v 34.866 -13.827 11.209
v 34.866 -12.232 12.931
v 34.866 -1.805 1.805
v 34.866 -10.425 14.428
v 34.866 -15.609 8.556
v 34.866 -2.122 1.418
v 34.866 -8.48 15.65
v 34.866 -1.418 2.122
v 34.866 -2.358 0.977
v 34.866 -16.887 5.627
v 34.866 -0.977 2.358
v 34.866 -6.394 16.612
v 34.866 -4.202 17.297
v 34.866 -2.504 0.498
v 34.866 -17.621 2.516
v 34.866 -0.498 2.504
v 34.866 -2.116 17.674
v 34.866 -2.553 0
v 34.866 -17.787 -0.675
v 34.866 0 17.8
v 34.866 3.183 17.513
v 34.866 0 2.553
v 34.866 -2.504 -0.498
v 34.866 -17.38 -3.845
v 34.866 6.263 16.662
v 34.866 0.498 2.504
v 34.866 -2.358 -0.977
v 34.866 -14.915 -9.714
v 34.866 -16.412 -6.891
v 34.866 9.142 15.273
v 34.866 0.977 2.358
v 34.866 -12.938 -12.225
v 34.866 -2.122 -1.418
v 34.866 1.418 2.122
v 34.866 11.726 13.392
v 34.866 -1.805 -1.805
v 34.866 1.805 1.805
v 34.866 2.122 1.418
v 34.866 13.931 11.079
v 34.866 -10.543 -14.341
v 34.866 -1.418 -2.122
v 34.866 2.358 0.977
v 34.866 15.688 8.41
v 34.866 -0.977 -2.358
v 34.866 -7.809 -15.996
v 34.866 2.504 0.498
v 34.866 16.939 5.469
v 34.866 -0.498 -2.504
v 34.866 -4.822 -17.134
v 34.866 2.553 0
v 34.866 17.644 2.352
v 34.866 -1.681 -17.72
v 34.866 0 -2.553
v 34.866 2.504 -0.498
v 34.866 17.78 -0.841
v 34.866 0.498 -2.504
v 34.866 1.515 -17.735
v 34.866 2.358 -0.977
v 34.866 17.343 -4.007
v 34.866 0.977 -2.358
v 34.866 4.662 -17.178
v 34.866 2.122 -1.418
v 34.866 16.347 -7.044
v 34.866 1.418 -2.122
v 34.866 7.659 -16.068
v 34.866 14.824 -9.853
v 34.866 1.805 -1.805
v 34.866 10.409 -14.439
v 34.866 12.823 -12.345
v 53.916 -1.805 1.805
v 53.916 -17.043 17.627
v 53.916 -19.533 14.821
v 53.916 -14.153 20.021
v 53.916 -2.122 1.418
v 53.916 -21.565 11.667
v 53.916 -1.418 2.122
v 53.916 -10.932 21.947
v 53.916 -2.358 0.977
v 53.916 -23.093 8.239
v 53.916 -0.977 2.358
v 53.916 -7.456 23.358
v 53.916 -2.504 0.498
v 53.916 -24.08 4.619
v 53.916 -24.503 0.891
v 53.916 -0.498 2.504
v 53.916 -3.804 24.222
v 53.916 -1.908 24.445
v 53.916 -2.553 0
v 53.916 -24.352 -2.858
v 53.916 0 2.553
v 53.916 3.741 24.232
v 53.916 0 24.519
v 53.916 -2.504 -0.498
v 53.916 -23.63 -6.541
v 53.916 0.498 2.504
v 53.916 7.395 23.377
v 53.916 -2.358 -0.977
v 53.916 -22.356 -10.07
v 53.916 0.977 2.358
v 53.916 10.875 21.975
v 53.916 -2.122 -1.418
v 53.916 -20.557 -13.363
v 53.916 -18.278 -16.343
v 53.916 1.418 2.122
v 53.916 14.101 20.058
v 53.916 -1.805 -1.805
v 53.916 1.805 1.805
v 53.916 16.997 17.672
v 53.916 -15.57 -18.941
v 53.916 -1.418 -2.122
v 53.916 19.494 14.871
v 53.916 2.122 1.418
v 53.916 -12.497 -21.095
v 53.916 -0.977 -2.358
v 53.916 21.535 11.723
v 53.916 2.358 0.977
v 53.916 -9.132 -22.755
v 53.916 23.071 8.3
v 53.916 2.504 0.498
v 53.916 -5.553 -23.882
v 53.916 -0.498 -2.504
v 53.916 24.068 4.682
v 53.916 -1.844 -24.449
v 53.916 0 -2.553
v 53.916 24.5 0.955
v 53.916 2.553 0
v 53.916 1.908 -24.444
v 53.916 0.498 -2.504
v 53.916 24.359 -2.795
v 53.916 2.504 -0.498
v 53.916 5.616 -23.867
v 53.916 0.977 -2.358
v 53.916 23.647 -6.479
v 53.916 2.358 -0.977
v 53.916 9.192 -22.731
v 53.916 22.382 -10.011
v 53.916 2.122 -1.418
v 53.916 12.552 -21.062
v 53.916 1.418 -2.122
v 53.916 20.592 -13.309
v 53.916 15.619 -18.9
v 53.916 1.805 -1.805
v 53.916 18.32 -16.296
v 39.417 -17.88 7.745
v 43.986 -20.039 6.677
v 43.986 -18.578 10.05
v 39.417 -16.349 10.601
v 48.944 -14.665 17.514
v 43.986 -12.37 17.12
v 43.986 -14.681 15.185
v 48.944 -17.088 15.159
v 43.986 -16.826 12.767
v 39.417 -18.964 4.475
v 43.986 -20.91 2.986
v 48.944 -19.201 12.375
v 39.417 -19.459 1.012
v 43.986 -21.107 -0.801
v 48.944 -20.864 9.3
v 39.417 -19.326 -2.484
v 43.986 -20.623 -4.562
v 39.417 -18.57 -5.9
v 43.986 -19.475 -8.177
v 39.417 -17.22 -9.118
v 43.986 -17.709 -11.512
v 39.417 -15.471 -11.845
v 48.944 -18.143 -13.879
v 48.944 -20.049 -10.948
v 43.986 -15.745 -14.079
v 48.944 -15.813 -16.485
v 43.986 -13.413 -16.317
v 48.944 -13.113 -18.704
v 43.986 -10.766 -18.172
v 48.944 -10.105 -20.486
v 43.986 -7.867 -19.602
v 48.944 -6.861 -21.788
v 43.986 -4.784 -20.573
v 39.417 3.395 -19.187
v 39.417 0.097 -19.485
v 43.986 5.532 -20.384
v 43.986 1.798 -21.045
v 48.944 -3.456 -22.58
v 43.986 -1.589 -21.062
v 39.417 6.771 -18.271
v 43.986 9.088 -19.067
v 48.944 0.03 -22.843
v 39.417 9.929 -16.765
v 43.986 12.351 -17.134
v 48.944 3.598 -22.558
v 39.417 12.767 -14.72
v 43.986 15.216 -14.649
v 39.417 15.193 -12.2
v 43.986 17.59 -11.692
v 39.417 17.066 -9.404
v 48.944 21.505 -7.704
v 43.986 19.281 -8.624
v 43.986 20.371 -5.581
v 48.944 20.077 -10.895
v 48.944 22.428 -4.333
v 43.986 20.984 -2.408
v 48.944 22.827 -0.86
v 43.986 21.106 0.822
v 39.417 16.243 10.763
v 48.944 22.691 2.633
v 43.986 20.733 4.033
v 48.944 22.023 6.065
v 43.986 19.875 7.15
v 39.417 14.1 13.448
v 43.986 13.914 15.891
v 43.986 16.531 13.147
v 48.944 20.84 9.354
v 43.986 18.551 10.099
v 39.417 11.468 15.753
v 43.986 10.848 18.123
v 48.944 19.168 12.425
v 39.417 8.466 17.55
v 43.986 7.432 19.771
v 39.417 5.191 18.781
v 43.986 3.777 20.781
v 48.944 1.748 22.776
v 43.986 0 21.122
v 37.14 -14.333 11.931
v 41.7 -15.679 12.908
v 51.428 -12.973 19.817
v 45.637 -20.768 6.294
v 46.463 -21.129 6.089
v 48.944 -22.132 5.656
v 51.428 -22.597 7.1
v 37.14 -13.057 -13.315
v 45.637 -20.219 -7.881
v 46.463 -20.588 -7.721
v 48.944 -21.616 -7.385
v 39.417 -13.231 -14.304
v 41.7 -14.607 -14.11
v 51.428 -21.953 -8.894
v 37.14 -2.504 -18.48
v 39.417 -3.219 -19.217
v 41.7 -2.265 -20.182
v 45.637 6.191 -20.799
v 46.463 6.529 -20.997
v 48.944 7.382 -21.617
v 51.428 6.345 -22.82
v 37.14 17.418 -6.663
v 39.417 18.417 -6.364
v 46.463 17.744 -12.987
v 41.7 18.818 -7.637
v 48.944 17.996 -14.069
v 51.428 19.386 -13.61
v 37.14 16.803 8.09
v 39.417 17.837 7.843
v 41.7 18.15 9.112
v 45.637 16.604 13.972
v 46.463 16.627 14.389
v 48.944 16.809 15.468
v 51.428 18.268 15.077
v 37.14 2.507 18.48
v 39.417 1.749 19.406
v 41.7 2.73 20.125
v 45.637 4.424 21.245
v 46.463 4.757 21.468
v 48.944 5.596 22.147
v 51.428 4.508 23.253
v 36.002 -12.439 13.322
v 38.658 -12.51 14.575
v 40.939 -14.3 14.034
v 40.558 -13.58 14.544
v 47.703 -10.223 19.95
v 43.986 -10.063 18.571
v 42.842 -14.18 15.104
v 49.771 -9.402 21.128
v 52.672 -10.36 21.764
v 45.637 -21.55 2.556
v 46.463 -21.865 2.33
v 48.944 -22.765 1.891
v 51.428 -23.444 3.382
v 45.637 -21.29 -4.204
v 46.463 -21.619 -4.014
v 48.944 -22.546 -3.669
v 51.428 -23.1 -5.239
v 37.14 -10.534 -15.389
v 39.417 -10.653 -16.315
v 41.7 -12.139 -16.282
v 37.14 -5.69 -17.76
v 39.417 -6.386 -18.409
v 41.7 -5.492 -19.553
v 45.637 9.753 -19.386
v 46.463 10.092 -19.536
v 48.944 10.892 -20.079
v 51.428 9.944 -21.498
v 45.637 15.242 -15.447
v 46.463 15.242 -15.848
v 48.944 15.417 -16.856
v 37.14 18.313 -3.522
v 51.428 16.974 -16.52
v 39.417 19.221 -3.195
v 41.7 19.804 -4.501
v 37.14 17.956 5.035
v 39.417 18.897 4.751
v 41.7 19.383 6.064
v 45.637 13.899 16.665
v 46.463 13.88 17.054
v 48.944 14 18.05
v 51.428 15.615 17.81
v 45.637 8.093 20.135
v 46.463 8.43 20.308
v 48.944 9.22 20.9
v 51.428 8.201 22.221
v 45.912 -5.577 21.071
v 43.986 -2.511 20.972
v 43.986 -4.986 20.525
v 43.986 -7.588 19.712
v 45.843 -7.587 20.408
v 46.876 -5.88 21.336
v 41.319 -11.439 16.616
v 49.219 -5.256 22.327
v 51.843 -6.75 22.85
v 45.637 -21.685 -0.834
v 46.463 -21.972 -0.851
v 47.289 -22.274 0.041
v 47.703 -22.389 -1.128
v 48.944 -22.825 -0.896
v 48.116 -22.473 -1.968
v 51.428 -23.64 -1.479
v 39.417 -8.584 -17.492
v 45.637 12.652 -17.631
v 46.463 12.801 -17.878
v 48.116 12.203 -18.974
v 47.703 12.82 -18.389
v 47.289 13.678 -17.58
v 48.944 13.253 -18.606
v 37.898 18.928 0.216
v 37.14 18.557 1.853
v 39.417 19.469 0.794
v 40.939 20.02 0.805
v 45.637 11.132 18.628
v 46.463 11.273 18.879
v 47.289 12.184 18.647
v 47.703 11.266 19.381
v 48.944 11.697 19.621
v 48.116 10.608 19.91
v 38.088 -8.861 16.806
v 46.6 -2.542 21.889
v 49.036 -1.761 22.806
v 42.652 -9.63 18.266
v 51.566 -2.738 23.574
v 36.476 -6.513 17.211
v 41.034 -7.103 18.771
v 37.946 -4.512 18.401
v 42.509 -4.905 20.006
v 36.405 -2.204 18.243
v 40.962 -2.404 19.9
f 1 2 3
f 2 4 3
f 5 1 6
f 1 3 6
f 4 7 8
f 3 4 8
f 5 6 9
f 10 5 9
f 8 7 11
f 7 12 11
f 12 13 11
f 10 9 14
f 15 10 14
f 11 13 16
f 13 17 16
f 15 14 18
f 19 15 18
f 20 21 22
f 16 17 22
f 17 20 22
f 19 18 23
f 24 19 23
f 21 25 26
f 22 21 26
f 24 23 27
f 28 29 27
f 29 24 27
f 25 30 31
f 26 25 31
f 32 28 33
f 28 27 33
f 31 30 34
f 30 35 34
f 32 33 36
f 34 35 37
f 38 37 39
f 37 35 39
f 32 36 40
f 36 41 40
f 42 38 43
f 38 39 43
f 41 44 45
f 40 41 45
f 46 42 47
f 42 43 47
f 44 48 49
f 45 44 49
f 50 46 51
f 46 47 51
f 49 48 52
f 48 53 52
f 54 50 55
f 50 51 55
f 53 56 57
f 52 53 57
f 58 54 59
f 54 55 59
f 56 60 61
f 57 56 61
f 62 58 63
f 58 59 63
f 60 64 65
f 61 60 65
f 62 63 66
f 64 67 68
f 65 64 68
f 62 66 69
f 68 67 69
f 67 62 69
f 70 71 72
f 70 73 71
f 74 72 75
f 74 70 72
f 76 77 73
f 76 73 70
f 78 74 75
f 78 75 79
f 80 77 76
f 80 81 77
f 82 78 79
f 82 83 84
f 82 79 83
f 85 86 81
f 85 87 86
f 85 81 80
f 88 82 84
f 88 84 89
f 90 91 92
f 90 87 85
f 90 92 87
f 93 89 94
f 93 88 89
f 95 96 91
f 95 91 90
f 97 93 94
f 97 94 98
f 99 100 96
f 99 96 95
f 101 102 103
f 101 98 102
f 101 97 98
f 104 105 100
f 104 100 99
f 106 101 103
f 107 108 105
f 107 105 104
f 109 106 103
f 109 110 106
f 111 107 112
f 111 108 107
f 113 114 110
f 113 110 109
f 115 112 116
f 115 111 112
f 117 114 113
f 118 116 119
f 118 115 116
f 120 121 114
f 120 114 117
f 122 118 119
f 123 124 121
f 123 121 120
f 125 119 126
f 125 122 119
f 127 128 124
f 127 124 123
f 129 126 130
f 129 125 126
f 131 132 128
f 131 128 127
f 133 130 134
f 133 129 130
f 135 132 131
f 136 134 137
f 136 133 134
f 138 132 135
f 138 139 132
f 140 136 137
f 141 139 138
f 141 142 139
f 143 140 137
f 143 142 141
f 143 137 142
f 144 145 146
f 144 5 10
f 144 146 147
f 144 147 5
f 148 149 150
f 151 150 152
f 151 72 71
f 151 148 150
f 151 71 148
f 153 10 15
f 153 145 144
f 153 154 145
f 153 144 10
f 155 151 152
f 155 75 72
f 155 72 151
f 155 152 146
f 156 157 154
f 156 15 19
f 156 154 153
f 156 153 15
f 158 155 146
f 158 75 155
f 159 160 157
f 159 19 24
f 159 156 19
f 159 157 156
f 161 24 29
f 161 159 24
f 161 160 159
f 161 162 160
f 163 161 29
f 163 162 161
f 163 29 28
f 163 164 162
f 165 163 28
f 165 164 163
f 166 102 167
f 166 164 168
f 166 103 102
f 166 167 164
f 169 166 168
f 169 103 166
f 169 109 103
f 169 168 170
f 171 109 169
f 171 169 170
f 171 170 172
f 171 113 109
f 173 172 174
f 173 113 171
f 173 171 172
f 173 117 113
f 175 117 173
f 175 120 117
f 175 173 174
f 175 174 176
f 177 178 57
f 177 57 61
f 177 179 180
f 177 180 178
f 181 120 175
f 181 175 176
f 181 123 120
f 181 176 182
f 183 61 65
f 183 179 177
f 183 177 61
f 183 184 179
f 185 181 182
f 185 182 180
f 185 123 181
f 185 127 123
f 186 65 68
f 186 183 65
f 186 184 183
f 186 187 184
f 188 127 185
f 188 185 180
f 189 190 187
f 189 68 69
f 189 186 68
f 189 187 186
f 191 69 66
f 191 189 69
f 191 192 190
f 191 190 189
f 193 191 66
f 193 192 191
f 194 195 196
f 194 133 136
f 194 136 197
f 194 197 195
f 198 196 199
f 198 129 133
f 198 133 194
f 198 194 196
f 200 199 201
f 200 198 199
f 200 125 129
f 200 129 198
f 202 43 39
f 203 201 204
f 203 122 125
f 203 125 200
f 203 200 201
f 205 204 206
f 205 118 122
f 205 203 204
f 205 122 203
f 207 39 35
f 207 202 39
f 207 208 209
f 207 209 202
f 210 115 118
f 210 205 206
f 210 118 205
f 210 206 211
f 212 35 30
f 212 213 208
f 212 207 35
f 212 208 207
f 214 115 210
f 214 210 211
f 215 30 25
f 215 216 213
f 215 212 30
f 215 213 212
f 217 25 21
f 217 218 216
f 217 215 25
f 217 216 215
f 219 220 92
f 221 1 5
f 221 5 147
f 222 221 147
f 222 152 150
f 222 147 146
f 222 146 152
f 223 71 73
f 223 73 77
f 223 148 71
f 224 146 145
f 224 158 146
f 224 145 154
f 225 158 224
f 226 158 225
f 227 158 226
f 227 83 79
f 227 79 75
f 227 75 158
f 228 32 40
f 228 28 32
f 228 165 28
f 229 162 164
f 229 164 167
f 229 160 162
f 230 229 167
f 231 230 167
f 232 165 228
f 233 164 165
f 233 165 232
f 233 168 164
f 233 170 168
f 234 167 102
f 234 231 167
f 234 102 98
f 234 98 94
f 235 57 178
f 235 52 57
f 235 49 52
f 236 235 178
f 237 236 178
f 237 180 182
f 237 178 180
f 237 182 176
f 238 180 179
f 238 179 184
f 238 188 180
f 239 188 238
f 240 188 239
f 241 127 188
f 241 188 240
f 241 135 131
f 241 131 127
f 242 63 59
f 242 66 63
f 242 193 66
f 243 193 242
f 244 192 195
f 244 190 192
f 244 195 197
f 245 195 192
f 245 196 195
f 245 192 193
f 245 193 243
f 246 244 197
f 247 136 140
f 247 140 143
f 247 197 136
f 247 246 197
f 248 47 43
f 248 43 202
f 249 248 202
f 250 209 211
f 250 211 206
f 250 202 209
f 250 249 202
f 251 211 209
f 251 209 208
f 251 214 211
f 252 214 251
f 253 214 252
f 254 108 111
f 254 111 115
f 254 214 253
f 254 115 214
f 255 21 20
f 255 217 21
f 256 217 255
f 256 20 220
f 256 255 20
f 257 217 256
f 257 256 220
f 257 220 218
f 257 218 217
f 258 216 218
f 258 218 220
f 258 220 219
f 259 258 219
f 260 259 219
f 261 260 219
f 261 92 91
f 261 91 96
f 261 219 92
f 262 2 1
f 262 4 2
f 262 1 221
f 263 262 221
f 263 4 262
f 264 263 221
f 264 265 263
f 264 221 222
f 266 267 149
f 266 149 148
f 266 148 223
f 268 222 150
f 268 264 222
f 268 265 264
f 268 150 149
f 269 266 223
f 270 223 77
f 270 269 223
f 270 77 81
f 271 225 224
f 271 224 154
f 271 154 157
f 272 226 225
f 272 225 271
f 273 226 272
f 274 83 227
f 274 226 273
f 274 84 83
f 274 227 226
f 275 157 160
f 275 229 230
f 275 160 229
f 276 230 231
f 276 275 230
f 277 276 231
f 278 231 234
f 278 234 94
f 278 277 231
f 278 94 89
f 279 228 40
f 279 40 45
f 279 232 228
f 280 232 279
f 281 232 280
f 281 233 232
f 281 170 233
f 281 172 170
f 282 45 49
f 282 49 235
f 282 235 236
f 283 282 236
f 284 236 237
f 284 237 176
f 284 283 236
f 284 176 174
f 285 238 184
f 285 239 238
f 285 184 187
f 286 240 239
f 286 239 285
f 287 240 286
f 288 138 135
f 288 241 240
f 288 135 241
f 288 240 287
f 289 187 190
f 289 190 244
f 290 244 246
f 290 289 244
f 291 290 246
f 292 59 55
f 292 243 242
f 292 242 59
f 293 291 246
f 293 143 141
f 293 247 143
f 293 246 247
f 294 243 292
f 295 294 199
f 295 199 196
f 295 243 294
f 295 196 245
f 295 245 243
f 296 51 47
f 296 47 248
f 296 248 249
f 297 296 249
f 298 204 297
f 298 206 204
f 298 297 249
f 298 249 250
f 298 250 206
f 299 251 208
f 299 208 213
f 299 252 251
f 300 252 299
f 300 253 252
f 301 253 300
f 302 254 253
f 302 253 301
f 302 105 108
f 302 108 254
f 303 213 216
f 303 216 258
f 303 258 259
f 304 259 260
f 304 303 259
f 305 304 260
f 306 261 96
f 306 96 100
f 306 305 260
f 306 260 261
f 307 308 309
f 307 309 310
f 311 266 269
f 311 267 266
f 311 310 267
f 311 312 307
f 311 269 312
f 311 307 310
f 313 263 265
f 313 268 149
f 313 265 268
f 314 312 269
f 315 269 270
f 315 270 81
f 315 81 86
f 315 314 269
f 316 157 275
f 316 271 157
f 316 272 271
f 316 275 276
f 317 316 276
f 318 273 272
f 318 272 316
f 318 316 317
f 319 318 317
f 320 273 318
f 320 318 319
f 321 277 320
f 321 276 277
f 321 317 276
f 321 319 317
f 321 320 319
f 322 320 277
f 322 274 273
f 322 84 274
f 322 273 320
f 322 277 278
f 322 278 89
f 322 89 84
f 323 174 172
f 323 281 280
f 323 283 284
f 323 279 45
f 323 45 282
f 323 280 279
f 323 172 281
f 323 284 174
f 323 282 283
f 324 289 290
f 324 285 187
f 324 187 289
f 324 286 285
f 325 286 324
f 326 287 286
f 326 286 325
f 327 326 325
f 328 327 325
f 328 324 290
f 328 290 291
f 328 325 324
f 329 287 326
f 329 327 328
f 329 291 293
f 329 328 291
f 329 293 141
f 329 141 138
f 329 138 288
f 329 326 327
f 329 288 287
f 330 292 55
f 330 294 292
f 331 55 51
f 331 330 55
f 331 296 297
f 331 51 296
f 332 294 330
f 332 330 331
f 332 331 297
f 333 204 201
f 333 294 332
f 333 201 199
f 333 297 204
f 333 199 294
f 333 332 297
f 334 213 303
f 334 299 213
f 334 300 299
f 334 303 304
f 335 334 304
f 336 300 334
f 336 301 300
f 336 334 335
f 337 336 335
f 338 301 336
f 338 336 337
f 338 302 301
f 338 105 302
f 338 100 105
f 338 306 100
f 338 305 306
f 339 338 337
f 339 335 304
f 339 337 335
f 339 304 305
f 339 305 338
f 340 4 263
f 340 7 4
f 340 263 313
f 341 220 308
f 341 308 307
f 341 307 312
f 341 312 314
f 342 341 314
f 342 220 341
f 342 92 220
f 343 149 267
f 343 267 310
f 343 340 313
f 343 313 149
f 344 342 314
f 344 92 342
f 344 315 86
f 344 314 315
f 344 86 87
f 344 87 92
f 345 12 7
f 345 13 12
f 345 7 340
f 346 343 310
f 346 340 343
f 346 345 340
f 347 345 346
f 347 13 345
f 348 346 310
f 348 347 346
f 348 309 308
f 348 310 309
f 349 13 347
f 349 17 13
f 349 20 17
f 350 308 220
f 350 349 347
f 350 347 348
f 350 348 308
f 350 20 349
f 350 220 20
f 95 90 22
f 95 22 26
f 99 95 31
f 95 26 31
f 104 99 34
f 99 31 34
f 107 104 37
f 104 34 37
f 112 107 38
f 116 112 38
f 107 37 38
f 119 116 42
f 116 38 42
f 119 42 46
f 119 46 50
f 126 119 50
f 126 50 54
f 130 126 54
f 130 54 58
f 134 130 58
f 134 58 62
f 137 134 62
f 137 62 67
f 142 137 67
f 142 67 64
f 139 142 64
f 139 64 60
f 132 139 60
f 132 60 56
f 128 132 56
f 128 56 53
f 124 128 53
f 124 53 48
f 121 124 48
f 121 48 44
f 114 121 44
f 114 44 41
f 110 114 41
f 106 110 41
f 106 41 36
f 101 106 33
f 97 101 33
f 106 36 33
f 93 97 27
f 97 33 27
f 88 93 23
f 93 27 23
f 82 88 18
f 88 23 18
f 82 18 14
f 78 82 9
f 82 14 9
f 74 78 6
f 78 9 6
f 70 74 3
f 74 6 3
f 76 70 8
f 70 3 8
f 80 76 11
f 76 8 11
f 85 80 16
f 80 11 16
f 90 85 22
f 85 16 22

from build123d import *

# Parameters (mm, degrees)
SKETCH4_R               = 95.25
CUT_EXTRUDE2_DEPTH      = 439.670222351
SKETCH2_R               = 95.25
CUT_EXTRUDE3_DEPTH      = 50.173367204
F_1_4_20_TAPPED_HOLE1_D = 5.1054


with BuildPart() as part:
    # Sketch1 → Revolve3 (revolve)
    with BuildSketch(Plane.XY, mode=Mode.PRIVATE) as revolve3_sk:
        with BuildLine():
            Line((0, 0), (457.2, 0))
            Line((457.2, 0), (471.392765137, 0))
            Line((471.392765137, 0), (471.392765137, 95.25))
            Line((471.392765137, 95.25), (457.2, 95.25))
            add(Edge.make_bspline(
                [(0, 0), (0.002261413, 0.012559634), (0.008229149, 0.03727132), (0.026197477, 0.085010802), (0.070593088, 0.176725307), (0.135390602, 0.284235785), (0.220401303, 0.406590084), (0.336037993, 0.556544126), (0.508304998, 0.760811711), (0.80208614, 1.073293742), (1.325080854, 1.565169332), (2.238118633, 2.319225256), (3.825271995, 3.466618443), (6.613989832, 5.225294798), (11.456120137, 7.876617711), (19.293604572, 11.601746405), (32.615554098, 17.130480015), (51.688271319, 23.981890995), (75.613057969, 31.54621241), (103.310212008, 39.361975261), (131.892371678, 46.686426538), (160.614305524, 53.440297164), (189.44815344, 59.696867207), (218.376688059, 65.499444524), (247.387631707, 70.874021631), (276.472706829, 75.831796355), (305.625866717, 80.372187528), (334.843049411, 84.481216859), (364.121565724, 88.129371268), (389.792768776, 90.870557363), (411.834102605, 92.837355417), (428.995077346, 94.067568174), (440.032338735, 94.69756489), (448.618051981, 95.062046142), (453.521410507, 95.200160943), (455.973700484, 95.244255862), (457.2, 95.25)],
                knots=[0, 0, 0, 0, 0, 0.000108244, 0.000216487, 0.000432974, 0.000865949, 0.001174715, 0.001483481, 0.002043604, 0.003138685, 0.004821522, 0.007588035, 0.012111566, 0.019790706, 0.032854349, 0.05452956, 0.085906528, 0.142462243, 0.205216412, 0.267970588, 0.330724763, 0.393478942, 0.456233118, 0.518987298, 0.581741474, 0.644495652, 0.707249831, 0.770004011, 0.832758189, 0.895512367, 0.926889456, 0.958266545, 0.979133273, 0.989566636, 1, 1, 1, 1, 1], degree=4))
        make_face()
    revolve(revolve3_sk.sketch.rotate(Axis((0, 0, 0), (1, 0, 0)), 90), axis=Axis((0, 0, 0), (1, 0, 0)))

    # Sketch4 → Cut-Extrude2 (cut, through all)
    with BuildSketch(Plane(origin=(53.916491633, 0, 0), x_dir=(0, 0, -1), z_dir=(1, 0, 0))):
        Circle(SKETCH4_R)
    extrude(amount=CUT_EXTRUDE2_DEPTH, mode=Mode.SUBTRACT)

    # Sketch2 → Cut-Extrude3 (cut, through all)
    with BuildSketch(Plane(origin=(34.866491633, 0, 0), x_dir=(0, 0, -1), z_dir=(1, 0, 0))):
        Circle(SKETCH2_R)
    extrude(amount=-CUT_EXTRUDE3_DEPTH, mode=Mode.SUBTRACT)

    # 1/4-20 Tapped Hole1 (through all)
    with Locations(Plane(origin=(53.916491633, 0, 0), x_dir=(0, 0, -1), z_dir=(1, 0, 0))):
        with Locations((0, 0)):
            Hole(F_1_4_20_TAPPED_HOLE1_D / 2)


solid = part.part
